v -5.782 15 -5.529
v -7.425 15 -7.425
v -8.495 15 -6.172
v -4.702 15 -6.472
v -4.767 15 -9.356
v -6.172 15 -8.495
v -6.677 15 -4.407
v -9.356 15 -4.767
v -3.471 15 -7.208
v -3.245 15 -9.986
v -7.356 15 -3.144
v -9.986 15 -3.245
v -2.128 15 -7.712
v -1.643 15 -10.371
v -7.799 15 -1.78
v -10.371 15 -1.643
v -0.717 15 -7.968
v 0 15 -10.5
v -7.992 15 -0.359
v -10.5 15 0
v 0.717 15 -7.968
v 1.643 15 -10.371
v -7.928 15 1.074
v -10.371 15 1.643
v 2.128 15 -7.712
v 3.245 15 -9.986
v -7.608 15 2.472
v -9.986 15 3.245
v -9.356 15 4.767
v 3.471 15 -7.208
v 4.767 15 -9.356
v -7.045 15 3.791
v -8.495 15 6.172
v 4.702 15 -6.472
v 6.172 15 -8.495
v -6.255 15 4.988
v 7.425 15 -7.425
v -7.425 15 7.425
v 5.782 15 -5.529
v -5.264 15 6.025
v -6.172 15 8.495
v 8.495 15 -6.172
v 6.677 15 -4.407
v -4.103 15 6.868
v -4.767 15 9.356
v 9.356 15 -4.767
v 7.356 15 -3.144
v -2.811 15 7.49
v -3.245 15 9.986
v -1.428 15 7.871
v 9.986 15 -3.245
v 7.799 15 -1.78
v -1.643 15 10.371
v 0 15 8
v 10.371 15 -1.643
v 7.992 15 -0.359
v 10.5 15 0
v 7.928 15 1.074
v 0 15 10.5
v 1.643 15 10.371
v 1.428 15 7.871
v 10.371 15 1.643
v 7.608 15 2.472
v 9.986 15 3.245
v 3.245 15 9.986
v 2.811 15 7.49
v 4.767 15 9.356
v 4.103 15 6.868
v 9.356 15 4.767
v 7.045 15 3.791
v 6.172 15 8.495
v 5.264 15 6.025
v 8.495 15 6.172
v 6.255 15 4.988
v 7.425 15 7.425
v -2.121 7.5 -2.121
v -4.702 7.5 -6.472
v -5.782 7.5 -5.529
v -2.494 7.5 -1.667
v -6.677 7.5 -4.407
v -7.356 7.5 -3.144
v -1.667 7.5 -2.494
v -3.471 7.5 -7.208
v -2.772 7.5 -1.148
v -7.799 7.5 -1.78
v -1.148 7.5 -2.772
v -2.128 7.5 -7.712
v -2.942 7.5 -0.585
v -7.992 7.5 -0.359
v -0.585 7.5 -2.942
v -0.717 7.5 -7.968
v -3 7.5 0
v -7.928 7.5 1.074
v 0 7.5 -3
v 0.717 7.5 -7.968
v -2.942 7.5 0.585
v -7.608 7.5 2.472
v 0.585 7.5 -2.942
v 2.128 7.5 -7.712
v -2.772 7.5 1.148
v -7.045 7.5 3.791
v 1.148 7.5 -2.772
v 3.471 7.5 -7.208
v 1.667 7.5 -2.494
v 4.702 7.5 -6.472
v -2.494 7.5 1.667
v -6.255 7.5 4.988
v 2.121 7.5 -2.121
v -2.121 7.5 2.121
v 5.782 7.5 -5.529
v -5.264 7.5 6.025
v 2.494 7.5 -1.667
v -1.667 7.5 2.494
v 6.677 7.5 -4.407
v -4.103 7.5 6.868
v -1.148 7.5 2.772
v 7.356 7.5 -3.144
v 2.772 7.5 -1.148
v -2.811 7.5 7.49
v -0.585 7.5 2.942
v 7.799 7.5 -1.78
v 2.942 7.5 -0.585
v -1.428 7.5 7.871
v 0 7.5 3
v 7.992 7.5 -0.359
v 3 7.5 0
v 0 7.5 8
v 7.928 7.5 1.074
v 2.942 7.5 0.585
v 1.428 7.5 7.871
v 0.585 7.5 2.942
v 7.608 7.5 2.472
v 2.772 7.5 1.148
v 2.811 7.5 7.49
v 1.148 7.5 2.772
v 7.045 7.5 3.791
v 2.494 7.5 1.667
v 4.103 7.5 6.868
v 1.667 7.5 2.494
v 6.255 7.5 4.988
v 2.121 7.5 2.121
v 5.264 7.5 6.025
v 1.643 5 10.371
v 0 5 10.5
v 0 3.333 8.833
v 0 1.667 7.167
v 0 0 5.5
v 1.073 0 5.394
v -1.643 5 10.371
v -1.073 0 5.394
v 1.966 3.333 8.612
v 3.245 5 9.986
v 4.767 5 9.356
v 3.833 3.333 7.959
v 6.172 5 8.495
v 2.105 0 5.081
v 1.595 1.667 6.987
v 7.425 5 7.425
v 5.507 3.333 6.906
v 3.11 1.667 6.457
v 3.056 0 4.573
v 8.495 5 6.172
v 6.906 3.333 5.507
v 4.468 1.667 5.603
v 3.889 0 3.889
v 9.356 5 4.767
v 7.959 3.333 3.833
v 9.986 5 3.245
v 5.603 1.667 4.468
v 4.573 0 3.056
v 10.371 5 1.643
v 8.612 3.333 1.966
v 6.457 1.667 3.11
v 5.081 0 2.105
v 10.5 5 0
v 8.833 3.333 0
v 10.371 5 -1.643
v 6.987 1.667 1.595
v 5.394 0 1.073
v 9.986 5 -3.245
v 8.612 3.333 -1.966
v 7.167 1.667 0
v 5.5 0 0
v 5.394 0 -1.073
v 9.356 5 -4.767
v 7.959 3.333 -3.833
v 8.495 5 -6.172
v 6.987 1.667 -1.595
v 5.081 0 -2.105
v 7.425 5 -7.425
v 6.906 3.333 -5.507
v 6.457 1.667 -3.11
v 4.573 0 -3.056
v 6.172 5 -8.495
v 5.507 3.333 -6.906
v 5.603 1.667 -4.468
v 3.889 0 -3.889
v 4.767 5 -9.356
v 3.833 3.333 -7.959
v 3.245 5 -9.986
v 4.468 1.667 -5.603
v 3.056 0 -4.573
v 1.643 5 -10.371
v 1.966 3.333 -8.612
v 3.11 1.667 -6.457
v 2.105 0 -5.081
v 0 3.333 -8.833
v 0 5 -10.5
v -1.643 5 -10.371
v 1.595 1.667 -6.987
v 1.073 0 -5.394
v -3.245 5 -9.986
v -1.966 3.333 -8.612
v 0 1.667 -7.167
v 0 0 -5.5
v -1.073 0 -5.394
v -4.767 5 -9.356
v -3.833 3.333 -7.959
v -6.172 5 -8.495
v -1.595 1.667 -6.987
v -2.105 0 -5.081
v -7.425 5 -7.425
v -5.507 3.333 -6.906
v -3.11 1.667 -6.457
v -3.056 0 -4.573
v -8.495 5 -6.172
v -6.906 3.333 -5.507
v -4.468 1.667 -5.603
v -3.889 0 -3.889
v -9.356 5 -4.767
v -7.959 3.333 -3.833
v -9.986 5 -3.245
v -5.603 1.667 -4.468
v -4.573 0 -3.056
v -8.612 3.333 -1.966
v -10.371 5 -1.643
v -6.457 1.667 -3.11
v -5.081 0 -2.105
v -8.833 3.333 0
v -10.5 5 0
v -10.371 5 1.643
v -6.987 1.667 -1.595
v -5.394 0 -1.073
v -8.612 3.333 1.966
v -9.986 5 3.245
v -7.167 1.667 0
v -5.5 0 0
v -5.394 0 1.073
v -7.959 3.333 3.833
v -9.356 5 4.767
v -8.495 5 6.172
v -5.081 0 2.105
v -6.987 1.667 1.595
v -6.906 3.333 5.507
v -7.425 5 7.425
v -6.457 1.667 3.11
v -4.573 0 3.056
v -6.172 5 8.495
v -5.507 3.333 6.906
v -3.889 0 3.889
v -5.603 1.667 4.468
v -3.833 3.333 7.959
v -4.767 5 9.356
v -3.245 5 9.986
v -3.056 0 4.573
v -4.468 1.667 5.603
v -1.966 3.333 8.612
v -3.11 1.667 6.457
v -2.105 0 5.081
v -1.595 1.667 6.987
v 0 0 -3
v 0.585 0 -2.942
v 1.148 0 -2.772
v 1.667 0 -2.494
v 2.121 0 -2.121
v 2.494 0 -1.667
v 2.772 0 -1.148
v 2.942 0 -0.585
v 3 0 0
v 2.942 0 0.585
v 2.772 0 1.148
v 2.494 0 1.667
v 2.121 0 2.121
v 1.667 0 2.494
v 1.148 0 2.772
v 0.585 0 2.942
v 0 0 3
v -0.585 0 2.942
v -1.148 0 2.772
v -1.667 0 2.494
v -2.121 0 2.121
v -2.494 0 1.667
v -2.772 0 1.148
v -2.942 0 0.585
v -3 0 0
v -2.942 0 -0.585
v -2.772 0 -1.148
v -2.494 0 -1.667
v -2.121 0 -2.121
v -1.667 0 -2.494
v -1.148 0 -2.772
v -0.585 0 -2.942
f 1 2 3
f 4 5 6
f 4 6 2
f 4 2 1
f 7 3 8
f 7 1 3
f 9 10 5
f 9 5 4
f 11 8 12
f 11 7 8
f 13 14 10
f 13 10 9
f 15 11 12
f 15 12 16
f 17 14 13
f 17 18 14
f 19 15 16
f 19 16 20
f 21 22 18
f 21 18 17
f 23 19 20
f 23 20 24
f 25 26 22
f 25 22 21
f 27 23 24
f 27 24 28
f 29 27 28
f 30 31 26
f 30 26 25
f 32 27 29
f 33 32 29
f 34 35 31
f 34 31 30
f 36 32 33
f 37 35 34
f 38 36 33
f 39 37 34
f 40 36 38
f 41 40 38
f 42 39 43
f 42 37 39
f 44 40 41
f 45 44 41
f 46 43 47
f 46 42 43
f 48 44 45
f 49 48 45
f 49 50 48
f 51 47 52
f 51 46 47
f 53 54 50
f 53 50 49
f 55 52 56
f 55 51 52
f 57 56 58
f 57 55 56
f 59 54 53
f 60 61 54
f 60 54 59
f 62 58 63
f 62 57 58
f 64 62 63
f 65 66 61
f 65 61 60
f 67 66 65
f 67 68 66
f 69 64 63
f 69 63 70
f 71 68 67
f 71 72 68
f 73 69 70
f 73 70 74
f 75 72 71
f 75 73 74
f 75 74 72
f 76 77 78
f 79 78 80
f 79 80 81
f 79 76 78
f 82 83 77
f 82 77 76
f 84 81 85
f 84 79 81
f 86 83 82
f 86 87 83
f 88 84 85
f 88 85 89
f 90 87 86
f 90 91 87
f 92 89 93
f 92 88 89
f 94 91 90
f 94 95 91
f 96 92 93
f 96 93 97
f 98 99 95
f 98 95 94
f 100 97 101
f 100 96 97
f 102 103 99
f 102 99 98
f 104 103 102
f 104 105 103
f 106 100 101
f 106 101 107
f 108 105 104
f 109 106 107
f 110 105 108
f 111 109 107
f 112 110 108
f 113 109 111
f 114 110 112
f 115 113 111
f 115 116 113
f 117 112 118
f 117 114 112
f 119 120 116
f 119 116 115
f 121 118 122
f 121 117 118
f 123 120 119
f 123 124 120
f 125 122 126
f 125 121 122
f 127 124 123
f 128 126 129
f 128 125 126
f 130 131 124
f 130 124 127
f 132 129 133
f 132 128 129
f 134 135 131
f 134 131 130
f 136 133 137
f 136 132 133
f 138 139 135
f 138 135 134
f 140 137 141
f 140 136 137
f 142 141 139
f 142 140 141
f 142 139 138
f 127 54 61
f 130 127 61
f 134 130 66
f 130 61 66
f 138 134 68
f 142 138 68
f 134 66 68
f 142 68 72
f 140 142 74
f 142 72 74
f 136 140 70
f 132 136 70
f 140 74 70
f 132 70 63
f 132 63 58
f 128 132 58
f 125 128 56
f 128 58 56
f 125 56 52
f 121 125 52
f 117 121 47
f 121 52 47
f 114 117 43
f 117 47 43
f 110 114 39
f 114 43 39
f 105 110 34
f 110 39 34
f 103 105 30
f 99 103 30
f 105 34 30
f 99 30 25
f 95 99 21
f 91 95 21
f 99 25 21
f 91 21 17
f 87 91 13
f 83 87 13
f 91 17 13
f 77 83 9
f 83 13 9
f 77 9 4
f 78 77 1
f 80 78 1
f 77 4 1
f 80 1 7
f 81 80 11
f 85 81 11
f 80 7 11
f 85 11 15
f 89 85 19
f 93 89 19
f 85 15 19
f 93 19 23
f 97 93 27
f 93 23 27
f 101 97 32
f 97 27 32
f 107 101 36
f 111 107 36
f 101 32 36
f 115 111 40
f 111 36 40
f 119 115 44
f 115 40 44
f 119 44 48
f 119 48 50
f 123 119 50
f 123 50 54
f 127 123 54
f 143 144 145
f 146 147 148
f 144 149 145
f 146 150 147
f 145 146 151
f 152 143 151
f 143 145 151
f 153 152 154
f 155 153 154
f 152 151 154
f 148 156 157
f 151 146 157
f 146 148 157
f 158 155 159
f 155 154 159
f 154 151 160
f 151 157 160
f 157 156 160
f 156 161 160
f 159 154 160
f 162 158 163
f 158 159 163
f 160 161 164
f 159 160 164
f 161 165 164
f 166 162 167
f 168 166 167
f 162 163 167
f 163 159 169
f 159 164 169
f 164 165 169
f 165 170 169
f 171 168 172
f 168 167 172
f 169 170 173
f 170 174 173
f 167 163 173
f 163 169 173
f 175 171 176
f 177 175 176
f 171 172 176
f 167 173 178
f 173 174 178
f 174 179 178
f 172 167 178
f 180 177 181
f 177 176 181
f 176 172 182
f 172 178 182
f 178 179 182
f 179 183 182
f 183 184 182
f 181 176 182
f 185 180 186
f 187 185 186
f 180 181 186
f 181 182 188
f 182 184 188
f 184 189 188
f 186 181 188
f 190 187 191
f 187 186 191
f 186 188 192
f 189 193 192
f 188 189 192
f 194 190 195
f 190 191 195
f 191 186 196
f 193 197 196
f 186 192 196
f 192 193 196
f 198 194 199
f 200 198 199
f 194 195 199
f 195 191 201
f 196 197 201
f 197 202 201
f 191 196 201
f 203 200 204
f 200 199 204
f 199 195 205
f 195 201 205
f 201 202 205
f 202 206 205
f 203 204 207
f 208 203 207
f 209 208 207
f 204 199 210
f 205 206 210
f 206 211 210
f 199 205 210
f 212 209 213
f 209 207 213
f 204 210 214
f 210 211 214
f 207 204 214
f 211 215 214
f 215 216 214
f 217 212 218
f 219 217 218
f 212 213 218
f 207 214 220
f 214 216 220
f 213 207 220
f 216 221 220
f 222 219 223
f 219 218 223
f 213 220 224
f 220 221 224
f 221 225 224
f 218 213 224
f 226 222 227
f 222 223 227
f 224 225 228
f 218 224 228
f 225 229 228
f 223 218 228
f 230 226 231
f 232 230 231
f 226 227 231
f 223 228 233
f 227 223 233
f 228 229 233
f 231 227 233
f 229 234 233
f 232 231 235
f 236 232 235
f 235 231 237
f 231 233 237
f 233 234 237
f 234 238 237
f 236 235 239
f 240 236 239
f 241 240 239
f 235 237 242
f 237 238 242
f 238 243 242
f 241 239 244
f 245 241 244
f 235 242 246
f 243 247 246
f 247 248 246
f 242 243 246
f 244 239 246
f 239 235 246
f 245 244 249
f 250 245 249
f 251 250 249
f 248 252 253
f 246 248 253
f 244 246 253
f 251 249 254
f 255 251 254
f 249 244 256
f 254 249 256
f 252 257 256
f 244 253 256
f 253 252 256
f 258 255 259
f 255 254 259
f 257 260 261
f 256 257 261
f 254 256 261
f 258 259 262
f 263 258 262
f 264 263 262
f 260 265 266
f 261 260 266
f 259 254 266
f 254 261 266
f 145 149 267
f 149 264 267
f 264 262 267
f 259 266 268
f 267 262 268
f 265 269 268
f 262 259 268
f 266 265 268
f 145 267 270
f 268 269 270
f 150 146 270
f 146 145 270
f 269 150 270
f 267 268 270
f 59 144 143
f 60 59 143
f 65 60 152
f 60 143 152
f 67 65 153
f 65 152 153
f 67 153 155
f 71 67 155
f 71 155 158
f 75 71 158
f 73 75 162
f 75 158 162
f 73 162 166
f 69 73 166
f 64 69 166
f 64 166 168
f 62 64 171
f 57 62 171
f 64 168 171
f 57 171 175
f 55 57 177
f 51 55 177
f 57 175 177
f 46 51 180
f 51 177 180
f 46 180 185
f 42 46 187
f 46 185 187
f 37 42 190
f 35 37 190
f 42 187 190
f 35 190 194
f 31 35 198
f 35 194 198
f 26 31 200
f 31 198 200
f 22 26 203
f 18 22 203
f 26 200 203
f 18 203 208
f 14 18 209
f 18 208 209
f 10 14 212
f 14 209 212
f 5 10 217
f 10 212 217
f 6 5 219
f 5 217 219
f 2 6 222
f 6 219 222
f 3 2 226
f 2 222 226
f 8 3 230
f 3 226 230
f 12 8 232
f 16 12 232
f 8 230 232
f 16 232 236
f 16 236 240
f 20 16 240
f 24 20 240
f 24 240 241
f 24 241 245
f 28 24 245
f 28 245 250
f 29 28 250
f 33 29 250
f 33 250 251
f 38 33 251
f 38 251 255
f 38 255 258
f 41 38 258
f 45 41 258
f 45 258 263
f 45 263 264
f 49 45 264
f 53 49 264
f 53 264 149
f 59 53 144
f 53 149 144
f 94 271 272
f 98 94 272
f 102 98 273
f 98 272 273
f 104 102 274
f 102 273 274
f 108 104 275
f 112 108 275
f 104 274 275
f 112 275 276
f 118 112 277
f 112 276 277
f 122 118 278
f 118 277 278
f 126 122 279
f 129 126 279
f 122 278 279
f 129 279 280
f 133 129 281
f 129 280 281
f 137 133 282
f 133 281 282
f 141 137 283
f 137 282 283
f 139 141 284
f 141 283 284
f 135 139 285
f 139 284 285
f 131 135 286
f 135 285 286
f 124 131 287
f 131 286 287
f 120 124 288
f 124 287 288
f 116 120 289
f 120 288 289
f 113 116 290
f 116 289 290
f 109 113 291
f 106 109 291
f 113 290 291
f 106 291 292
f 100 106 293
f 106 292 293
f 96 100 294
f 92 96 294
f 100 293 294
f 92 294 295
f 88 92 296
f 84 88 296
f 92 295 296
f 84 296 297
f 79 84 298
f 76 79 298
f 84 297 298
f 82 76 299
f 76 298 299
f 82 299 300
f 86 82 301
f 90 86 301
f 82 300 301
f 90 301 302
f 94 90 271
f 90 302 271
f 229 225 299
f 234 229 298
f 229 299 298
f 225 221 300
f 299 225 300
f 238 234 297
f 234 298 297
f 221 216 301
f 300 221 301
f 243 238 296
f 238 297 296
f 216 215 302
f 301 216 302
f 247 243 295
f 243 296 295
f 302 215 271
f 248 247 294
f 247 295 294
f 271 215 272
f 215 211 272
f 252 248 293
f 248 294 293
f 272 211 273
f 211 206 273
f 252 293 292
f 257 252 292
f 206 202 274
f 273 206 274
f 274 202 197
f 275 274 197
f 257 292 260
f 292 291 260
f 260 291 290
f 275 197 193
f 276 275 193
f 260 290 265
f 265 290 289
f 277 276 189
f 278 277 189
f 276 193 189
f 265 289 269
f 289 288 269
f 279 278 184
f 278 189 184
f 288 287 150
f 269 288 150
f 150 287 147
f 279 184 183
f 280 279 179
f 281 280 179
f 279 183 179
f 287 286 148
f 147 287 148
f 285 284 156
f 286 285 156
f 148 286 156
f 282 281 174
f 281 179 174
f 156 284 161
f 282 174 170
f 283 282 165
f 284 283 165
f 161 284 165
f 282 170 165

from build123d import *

# Parameters (mm, degrees)
SKETCH1_R           = 10.5
BOSS_EXTRUDE1_DEPTH = 15
SKETCH2_R           = 8
CUT_EXTRUDE1_DEPTH  = 7.5
SKETCH3_R           = 3
CUT_EXTRUDE2_DEPTH  = 7.5
CHAMFER1_SIZE       = 5


with BuildPart() as part:
    # Sketch1 → Boss-Extrude1 (new body)
    with BuildSketch(Plane(origin=(0, 0, 0), x_dir=(1, 0, 0), z_dir=(0, 1, 0))):
        with Locations(Location((0, 0, 0), (0, 0, 270))):
            Circle(SKETCH1_R)
    extrude(amount=BOSS_EXTRUDE1_DEPTH)

    # Sketch2 → Cut-Extrude1 (cut)
    with BuildSketch(Plane(origin=(0, 15, 0), x_dir=(1, 0, 0), z_dir=(0, 1, 0))):
        with Locations(Location((0, 0, 0), (0, 0, 270))):
            Circle(SKETCH2_R)
    extrude(amount=-CUT_EXTRUDE1_DEPTH, mode=Mode.SUBTRACT)

    # Sketch3 → Cut-Extrude2 (cut)
    with BuildSketch(Plane.XZ):
        with Locations(Location((0, 0, 0), (0, 0, 270))):
            Circle(SKETCH3_R)
    extrude(amount=-CUT_EXTRUDE2_DEPTH, mode=Mode.SUBTRACT)

    # Chamfer1
    chamfer1_edges = [part.edges().sort_by_distance(p)[0] for p in [
        (0, 0, -10.5),
    ]]
    chamfer(chamfer1_edges, length=CHAMFER1_SIZE)


solid = part.part
